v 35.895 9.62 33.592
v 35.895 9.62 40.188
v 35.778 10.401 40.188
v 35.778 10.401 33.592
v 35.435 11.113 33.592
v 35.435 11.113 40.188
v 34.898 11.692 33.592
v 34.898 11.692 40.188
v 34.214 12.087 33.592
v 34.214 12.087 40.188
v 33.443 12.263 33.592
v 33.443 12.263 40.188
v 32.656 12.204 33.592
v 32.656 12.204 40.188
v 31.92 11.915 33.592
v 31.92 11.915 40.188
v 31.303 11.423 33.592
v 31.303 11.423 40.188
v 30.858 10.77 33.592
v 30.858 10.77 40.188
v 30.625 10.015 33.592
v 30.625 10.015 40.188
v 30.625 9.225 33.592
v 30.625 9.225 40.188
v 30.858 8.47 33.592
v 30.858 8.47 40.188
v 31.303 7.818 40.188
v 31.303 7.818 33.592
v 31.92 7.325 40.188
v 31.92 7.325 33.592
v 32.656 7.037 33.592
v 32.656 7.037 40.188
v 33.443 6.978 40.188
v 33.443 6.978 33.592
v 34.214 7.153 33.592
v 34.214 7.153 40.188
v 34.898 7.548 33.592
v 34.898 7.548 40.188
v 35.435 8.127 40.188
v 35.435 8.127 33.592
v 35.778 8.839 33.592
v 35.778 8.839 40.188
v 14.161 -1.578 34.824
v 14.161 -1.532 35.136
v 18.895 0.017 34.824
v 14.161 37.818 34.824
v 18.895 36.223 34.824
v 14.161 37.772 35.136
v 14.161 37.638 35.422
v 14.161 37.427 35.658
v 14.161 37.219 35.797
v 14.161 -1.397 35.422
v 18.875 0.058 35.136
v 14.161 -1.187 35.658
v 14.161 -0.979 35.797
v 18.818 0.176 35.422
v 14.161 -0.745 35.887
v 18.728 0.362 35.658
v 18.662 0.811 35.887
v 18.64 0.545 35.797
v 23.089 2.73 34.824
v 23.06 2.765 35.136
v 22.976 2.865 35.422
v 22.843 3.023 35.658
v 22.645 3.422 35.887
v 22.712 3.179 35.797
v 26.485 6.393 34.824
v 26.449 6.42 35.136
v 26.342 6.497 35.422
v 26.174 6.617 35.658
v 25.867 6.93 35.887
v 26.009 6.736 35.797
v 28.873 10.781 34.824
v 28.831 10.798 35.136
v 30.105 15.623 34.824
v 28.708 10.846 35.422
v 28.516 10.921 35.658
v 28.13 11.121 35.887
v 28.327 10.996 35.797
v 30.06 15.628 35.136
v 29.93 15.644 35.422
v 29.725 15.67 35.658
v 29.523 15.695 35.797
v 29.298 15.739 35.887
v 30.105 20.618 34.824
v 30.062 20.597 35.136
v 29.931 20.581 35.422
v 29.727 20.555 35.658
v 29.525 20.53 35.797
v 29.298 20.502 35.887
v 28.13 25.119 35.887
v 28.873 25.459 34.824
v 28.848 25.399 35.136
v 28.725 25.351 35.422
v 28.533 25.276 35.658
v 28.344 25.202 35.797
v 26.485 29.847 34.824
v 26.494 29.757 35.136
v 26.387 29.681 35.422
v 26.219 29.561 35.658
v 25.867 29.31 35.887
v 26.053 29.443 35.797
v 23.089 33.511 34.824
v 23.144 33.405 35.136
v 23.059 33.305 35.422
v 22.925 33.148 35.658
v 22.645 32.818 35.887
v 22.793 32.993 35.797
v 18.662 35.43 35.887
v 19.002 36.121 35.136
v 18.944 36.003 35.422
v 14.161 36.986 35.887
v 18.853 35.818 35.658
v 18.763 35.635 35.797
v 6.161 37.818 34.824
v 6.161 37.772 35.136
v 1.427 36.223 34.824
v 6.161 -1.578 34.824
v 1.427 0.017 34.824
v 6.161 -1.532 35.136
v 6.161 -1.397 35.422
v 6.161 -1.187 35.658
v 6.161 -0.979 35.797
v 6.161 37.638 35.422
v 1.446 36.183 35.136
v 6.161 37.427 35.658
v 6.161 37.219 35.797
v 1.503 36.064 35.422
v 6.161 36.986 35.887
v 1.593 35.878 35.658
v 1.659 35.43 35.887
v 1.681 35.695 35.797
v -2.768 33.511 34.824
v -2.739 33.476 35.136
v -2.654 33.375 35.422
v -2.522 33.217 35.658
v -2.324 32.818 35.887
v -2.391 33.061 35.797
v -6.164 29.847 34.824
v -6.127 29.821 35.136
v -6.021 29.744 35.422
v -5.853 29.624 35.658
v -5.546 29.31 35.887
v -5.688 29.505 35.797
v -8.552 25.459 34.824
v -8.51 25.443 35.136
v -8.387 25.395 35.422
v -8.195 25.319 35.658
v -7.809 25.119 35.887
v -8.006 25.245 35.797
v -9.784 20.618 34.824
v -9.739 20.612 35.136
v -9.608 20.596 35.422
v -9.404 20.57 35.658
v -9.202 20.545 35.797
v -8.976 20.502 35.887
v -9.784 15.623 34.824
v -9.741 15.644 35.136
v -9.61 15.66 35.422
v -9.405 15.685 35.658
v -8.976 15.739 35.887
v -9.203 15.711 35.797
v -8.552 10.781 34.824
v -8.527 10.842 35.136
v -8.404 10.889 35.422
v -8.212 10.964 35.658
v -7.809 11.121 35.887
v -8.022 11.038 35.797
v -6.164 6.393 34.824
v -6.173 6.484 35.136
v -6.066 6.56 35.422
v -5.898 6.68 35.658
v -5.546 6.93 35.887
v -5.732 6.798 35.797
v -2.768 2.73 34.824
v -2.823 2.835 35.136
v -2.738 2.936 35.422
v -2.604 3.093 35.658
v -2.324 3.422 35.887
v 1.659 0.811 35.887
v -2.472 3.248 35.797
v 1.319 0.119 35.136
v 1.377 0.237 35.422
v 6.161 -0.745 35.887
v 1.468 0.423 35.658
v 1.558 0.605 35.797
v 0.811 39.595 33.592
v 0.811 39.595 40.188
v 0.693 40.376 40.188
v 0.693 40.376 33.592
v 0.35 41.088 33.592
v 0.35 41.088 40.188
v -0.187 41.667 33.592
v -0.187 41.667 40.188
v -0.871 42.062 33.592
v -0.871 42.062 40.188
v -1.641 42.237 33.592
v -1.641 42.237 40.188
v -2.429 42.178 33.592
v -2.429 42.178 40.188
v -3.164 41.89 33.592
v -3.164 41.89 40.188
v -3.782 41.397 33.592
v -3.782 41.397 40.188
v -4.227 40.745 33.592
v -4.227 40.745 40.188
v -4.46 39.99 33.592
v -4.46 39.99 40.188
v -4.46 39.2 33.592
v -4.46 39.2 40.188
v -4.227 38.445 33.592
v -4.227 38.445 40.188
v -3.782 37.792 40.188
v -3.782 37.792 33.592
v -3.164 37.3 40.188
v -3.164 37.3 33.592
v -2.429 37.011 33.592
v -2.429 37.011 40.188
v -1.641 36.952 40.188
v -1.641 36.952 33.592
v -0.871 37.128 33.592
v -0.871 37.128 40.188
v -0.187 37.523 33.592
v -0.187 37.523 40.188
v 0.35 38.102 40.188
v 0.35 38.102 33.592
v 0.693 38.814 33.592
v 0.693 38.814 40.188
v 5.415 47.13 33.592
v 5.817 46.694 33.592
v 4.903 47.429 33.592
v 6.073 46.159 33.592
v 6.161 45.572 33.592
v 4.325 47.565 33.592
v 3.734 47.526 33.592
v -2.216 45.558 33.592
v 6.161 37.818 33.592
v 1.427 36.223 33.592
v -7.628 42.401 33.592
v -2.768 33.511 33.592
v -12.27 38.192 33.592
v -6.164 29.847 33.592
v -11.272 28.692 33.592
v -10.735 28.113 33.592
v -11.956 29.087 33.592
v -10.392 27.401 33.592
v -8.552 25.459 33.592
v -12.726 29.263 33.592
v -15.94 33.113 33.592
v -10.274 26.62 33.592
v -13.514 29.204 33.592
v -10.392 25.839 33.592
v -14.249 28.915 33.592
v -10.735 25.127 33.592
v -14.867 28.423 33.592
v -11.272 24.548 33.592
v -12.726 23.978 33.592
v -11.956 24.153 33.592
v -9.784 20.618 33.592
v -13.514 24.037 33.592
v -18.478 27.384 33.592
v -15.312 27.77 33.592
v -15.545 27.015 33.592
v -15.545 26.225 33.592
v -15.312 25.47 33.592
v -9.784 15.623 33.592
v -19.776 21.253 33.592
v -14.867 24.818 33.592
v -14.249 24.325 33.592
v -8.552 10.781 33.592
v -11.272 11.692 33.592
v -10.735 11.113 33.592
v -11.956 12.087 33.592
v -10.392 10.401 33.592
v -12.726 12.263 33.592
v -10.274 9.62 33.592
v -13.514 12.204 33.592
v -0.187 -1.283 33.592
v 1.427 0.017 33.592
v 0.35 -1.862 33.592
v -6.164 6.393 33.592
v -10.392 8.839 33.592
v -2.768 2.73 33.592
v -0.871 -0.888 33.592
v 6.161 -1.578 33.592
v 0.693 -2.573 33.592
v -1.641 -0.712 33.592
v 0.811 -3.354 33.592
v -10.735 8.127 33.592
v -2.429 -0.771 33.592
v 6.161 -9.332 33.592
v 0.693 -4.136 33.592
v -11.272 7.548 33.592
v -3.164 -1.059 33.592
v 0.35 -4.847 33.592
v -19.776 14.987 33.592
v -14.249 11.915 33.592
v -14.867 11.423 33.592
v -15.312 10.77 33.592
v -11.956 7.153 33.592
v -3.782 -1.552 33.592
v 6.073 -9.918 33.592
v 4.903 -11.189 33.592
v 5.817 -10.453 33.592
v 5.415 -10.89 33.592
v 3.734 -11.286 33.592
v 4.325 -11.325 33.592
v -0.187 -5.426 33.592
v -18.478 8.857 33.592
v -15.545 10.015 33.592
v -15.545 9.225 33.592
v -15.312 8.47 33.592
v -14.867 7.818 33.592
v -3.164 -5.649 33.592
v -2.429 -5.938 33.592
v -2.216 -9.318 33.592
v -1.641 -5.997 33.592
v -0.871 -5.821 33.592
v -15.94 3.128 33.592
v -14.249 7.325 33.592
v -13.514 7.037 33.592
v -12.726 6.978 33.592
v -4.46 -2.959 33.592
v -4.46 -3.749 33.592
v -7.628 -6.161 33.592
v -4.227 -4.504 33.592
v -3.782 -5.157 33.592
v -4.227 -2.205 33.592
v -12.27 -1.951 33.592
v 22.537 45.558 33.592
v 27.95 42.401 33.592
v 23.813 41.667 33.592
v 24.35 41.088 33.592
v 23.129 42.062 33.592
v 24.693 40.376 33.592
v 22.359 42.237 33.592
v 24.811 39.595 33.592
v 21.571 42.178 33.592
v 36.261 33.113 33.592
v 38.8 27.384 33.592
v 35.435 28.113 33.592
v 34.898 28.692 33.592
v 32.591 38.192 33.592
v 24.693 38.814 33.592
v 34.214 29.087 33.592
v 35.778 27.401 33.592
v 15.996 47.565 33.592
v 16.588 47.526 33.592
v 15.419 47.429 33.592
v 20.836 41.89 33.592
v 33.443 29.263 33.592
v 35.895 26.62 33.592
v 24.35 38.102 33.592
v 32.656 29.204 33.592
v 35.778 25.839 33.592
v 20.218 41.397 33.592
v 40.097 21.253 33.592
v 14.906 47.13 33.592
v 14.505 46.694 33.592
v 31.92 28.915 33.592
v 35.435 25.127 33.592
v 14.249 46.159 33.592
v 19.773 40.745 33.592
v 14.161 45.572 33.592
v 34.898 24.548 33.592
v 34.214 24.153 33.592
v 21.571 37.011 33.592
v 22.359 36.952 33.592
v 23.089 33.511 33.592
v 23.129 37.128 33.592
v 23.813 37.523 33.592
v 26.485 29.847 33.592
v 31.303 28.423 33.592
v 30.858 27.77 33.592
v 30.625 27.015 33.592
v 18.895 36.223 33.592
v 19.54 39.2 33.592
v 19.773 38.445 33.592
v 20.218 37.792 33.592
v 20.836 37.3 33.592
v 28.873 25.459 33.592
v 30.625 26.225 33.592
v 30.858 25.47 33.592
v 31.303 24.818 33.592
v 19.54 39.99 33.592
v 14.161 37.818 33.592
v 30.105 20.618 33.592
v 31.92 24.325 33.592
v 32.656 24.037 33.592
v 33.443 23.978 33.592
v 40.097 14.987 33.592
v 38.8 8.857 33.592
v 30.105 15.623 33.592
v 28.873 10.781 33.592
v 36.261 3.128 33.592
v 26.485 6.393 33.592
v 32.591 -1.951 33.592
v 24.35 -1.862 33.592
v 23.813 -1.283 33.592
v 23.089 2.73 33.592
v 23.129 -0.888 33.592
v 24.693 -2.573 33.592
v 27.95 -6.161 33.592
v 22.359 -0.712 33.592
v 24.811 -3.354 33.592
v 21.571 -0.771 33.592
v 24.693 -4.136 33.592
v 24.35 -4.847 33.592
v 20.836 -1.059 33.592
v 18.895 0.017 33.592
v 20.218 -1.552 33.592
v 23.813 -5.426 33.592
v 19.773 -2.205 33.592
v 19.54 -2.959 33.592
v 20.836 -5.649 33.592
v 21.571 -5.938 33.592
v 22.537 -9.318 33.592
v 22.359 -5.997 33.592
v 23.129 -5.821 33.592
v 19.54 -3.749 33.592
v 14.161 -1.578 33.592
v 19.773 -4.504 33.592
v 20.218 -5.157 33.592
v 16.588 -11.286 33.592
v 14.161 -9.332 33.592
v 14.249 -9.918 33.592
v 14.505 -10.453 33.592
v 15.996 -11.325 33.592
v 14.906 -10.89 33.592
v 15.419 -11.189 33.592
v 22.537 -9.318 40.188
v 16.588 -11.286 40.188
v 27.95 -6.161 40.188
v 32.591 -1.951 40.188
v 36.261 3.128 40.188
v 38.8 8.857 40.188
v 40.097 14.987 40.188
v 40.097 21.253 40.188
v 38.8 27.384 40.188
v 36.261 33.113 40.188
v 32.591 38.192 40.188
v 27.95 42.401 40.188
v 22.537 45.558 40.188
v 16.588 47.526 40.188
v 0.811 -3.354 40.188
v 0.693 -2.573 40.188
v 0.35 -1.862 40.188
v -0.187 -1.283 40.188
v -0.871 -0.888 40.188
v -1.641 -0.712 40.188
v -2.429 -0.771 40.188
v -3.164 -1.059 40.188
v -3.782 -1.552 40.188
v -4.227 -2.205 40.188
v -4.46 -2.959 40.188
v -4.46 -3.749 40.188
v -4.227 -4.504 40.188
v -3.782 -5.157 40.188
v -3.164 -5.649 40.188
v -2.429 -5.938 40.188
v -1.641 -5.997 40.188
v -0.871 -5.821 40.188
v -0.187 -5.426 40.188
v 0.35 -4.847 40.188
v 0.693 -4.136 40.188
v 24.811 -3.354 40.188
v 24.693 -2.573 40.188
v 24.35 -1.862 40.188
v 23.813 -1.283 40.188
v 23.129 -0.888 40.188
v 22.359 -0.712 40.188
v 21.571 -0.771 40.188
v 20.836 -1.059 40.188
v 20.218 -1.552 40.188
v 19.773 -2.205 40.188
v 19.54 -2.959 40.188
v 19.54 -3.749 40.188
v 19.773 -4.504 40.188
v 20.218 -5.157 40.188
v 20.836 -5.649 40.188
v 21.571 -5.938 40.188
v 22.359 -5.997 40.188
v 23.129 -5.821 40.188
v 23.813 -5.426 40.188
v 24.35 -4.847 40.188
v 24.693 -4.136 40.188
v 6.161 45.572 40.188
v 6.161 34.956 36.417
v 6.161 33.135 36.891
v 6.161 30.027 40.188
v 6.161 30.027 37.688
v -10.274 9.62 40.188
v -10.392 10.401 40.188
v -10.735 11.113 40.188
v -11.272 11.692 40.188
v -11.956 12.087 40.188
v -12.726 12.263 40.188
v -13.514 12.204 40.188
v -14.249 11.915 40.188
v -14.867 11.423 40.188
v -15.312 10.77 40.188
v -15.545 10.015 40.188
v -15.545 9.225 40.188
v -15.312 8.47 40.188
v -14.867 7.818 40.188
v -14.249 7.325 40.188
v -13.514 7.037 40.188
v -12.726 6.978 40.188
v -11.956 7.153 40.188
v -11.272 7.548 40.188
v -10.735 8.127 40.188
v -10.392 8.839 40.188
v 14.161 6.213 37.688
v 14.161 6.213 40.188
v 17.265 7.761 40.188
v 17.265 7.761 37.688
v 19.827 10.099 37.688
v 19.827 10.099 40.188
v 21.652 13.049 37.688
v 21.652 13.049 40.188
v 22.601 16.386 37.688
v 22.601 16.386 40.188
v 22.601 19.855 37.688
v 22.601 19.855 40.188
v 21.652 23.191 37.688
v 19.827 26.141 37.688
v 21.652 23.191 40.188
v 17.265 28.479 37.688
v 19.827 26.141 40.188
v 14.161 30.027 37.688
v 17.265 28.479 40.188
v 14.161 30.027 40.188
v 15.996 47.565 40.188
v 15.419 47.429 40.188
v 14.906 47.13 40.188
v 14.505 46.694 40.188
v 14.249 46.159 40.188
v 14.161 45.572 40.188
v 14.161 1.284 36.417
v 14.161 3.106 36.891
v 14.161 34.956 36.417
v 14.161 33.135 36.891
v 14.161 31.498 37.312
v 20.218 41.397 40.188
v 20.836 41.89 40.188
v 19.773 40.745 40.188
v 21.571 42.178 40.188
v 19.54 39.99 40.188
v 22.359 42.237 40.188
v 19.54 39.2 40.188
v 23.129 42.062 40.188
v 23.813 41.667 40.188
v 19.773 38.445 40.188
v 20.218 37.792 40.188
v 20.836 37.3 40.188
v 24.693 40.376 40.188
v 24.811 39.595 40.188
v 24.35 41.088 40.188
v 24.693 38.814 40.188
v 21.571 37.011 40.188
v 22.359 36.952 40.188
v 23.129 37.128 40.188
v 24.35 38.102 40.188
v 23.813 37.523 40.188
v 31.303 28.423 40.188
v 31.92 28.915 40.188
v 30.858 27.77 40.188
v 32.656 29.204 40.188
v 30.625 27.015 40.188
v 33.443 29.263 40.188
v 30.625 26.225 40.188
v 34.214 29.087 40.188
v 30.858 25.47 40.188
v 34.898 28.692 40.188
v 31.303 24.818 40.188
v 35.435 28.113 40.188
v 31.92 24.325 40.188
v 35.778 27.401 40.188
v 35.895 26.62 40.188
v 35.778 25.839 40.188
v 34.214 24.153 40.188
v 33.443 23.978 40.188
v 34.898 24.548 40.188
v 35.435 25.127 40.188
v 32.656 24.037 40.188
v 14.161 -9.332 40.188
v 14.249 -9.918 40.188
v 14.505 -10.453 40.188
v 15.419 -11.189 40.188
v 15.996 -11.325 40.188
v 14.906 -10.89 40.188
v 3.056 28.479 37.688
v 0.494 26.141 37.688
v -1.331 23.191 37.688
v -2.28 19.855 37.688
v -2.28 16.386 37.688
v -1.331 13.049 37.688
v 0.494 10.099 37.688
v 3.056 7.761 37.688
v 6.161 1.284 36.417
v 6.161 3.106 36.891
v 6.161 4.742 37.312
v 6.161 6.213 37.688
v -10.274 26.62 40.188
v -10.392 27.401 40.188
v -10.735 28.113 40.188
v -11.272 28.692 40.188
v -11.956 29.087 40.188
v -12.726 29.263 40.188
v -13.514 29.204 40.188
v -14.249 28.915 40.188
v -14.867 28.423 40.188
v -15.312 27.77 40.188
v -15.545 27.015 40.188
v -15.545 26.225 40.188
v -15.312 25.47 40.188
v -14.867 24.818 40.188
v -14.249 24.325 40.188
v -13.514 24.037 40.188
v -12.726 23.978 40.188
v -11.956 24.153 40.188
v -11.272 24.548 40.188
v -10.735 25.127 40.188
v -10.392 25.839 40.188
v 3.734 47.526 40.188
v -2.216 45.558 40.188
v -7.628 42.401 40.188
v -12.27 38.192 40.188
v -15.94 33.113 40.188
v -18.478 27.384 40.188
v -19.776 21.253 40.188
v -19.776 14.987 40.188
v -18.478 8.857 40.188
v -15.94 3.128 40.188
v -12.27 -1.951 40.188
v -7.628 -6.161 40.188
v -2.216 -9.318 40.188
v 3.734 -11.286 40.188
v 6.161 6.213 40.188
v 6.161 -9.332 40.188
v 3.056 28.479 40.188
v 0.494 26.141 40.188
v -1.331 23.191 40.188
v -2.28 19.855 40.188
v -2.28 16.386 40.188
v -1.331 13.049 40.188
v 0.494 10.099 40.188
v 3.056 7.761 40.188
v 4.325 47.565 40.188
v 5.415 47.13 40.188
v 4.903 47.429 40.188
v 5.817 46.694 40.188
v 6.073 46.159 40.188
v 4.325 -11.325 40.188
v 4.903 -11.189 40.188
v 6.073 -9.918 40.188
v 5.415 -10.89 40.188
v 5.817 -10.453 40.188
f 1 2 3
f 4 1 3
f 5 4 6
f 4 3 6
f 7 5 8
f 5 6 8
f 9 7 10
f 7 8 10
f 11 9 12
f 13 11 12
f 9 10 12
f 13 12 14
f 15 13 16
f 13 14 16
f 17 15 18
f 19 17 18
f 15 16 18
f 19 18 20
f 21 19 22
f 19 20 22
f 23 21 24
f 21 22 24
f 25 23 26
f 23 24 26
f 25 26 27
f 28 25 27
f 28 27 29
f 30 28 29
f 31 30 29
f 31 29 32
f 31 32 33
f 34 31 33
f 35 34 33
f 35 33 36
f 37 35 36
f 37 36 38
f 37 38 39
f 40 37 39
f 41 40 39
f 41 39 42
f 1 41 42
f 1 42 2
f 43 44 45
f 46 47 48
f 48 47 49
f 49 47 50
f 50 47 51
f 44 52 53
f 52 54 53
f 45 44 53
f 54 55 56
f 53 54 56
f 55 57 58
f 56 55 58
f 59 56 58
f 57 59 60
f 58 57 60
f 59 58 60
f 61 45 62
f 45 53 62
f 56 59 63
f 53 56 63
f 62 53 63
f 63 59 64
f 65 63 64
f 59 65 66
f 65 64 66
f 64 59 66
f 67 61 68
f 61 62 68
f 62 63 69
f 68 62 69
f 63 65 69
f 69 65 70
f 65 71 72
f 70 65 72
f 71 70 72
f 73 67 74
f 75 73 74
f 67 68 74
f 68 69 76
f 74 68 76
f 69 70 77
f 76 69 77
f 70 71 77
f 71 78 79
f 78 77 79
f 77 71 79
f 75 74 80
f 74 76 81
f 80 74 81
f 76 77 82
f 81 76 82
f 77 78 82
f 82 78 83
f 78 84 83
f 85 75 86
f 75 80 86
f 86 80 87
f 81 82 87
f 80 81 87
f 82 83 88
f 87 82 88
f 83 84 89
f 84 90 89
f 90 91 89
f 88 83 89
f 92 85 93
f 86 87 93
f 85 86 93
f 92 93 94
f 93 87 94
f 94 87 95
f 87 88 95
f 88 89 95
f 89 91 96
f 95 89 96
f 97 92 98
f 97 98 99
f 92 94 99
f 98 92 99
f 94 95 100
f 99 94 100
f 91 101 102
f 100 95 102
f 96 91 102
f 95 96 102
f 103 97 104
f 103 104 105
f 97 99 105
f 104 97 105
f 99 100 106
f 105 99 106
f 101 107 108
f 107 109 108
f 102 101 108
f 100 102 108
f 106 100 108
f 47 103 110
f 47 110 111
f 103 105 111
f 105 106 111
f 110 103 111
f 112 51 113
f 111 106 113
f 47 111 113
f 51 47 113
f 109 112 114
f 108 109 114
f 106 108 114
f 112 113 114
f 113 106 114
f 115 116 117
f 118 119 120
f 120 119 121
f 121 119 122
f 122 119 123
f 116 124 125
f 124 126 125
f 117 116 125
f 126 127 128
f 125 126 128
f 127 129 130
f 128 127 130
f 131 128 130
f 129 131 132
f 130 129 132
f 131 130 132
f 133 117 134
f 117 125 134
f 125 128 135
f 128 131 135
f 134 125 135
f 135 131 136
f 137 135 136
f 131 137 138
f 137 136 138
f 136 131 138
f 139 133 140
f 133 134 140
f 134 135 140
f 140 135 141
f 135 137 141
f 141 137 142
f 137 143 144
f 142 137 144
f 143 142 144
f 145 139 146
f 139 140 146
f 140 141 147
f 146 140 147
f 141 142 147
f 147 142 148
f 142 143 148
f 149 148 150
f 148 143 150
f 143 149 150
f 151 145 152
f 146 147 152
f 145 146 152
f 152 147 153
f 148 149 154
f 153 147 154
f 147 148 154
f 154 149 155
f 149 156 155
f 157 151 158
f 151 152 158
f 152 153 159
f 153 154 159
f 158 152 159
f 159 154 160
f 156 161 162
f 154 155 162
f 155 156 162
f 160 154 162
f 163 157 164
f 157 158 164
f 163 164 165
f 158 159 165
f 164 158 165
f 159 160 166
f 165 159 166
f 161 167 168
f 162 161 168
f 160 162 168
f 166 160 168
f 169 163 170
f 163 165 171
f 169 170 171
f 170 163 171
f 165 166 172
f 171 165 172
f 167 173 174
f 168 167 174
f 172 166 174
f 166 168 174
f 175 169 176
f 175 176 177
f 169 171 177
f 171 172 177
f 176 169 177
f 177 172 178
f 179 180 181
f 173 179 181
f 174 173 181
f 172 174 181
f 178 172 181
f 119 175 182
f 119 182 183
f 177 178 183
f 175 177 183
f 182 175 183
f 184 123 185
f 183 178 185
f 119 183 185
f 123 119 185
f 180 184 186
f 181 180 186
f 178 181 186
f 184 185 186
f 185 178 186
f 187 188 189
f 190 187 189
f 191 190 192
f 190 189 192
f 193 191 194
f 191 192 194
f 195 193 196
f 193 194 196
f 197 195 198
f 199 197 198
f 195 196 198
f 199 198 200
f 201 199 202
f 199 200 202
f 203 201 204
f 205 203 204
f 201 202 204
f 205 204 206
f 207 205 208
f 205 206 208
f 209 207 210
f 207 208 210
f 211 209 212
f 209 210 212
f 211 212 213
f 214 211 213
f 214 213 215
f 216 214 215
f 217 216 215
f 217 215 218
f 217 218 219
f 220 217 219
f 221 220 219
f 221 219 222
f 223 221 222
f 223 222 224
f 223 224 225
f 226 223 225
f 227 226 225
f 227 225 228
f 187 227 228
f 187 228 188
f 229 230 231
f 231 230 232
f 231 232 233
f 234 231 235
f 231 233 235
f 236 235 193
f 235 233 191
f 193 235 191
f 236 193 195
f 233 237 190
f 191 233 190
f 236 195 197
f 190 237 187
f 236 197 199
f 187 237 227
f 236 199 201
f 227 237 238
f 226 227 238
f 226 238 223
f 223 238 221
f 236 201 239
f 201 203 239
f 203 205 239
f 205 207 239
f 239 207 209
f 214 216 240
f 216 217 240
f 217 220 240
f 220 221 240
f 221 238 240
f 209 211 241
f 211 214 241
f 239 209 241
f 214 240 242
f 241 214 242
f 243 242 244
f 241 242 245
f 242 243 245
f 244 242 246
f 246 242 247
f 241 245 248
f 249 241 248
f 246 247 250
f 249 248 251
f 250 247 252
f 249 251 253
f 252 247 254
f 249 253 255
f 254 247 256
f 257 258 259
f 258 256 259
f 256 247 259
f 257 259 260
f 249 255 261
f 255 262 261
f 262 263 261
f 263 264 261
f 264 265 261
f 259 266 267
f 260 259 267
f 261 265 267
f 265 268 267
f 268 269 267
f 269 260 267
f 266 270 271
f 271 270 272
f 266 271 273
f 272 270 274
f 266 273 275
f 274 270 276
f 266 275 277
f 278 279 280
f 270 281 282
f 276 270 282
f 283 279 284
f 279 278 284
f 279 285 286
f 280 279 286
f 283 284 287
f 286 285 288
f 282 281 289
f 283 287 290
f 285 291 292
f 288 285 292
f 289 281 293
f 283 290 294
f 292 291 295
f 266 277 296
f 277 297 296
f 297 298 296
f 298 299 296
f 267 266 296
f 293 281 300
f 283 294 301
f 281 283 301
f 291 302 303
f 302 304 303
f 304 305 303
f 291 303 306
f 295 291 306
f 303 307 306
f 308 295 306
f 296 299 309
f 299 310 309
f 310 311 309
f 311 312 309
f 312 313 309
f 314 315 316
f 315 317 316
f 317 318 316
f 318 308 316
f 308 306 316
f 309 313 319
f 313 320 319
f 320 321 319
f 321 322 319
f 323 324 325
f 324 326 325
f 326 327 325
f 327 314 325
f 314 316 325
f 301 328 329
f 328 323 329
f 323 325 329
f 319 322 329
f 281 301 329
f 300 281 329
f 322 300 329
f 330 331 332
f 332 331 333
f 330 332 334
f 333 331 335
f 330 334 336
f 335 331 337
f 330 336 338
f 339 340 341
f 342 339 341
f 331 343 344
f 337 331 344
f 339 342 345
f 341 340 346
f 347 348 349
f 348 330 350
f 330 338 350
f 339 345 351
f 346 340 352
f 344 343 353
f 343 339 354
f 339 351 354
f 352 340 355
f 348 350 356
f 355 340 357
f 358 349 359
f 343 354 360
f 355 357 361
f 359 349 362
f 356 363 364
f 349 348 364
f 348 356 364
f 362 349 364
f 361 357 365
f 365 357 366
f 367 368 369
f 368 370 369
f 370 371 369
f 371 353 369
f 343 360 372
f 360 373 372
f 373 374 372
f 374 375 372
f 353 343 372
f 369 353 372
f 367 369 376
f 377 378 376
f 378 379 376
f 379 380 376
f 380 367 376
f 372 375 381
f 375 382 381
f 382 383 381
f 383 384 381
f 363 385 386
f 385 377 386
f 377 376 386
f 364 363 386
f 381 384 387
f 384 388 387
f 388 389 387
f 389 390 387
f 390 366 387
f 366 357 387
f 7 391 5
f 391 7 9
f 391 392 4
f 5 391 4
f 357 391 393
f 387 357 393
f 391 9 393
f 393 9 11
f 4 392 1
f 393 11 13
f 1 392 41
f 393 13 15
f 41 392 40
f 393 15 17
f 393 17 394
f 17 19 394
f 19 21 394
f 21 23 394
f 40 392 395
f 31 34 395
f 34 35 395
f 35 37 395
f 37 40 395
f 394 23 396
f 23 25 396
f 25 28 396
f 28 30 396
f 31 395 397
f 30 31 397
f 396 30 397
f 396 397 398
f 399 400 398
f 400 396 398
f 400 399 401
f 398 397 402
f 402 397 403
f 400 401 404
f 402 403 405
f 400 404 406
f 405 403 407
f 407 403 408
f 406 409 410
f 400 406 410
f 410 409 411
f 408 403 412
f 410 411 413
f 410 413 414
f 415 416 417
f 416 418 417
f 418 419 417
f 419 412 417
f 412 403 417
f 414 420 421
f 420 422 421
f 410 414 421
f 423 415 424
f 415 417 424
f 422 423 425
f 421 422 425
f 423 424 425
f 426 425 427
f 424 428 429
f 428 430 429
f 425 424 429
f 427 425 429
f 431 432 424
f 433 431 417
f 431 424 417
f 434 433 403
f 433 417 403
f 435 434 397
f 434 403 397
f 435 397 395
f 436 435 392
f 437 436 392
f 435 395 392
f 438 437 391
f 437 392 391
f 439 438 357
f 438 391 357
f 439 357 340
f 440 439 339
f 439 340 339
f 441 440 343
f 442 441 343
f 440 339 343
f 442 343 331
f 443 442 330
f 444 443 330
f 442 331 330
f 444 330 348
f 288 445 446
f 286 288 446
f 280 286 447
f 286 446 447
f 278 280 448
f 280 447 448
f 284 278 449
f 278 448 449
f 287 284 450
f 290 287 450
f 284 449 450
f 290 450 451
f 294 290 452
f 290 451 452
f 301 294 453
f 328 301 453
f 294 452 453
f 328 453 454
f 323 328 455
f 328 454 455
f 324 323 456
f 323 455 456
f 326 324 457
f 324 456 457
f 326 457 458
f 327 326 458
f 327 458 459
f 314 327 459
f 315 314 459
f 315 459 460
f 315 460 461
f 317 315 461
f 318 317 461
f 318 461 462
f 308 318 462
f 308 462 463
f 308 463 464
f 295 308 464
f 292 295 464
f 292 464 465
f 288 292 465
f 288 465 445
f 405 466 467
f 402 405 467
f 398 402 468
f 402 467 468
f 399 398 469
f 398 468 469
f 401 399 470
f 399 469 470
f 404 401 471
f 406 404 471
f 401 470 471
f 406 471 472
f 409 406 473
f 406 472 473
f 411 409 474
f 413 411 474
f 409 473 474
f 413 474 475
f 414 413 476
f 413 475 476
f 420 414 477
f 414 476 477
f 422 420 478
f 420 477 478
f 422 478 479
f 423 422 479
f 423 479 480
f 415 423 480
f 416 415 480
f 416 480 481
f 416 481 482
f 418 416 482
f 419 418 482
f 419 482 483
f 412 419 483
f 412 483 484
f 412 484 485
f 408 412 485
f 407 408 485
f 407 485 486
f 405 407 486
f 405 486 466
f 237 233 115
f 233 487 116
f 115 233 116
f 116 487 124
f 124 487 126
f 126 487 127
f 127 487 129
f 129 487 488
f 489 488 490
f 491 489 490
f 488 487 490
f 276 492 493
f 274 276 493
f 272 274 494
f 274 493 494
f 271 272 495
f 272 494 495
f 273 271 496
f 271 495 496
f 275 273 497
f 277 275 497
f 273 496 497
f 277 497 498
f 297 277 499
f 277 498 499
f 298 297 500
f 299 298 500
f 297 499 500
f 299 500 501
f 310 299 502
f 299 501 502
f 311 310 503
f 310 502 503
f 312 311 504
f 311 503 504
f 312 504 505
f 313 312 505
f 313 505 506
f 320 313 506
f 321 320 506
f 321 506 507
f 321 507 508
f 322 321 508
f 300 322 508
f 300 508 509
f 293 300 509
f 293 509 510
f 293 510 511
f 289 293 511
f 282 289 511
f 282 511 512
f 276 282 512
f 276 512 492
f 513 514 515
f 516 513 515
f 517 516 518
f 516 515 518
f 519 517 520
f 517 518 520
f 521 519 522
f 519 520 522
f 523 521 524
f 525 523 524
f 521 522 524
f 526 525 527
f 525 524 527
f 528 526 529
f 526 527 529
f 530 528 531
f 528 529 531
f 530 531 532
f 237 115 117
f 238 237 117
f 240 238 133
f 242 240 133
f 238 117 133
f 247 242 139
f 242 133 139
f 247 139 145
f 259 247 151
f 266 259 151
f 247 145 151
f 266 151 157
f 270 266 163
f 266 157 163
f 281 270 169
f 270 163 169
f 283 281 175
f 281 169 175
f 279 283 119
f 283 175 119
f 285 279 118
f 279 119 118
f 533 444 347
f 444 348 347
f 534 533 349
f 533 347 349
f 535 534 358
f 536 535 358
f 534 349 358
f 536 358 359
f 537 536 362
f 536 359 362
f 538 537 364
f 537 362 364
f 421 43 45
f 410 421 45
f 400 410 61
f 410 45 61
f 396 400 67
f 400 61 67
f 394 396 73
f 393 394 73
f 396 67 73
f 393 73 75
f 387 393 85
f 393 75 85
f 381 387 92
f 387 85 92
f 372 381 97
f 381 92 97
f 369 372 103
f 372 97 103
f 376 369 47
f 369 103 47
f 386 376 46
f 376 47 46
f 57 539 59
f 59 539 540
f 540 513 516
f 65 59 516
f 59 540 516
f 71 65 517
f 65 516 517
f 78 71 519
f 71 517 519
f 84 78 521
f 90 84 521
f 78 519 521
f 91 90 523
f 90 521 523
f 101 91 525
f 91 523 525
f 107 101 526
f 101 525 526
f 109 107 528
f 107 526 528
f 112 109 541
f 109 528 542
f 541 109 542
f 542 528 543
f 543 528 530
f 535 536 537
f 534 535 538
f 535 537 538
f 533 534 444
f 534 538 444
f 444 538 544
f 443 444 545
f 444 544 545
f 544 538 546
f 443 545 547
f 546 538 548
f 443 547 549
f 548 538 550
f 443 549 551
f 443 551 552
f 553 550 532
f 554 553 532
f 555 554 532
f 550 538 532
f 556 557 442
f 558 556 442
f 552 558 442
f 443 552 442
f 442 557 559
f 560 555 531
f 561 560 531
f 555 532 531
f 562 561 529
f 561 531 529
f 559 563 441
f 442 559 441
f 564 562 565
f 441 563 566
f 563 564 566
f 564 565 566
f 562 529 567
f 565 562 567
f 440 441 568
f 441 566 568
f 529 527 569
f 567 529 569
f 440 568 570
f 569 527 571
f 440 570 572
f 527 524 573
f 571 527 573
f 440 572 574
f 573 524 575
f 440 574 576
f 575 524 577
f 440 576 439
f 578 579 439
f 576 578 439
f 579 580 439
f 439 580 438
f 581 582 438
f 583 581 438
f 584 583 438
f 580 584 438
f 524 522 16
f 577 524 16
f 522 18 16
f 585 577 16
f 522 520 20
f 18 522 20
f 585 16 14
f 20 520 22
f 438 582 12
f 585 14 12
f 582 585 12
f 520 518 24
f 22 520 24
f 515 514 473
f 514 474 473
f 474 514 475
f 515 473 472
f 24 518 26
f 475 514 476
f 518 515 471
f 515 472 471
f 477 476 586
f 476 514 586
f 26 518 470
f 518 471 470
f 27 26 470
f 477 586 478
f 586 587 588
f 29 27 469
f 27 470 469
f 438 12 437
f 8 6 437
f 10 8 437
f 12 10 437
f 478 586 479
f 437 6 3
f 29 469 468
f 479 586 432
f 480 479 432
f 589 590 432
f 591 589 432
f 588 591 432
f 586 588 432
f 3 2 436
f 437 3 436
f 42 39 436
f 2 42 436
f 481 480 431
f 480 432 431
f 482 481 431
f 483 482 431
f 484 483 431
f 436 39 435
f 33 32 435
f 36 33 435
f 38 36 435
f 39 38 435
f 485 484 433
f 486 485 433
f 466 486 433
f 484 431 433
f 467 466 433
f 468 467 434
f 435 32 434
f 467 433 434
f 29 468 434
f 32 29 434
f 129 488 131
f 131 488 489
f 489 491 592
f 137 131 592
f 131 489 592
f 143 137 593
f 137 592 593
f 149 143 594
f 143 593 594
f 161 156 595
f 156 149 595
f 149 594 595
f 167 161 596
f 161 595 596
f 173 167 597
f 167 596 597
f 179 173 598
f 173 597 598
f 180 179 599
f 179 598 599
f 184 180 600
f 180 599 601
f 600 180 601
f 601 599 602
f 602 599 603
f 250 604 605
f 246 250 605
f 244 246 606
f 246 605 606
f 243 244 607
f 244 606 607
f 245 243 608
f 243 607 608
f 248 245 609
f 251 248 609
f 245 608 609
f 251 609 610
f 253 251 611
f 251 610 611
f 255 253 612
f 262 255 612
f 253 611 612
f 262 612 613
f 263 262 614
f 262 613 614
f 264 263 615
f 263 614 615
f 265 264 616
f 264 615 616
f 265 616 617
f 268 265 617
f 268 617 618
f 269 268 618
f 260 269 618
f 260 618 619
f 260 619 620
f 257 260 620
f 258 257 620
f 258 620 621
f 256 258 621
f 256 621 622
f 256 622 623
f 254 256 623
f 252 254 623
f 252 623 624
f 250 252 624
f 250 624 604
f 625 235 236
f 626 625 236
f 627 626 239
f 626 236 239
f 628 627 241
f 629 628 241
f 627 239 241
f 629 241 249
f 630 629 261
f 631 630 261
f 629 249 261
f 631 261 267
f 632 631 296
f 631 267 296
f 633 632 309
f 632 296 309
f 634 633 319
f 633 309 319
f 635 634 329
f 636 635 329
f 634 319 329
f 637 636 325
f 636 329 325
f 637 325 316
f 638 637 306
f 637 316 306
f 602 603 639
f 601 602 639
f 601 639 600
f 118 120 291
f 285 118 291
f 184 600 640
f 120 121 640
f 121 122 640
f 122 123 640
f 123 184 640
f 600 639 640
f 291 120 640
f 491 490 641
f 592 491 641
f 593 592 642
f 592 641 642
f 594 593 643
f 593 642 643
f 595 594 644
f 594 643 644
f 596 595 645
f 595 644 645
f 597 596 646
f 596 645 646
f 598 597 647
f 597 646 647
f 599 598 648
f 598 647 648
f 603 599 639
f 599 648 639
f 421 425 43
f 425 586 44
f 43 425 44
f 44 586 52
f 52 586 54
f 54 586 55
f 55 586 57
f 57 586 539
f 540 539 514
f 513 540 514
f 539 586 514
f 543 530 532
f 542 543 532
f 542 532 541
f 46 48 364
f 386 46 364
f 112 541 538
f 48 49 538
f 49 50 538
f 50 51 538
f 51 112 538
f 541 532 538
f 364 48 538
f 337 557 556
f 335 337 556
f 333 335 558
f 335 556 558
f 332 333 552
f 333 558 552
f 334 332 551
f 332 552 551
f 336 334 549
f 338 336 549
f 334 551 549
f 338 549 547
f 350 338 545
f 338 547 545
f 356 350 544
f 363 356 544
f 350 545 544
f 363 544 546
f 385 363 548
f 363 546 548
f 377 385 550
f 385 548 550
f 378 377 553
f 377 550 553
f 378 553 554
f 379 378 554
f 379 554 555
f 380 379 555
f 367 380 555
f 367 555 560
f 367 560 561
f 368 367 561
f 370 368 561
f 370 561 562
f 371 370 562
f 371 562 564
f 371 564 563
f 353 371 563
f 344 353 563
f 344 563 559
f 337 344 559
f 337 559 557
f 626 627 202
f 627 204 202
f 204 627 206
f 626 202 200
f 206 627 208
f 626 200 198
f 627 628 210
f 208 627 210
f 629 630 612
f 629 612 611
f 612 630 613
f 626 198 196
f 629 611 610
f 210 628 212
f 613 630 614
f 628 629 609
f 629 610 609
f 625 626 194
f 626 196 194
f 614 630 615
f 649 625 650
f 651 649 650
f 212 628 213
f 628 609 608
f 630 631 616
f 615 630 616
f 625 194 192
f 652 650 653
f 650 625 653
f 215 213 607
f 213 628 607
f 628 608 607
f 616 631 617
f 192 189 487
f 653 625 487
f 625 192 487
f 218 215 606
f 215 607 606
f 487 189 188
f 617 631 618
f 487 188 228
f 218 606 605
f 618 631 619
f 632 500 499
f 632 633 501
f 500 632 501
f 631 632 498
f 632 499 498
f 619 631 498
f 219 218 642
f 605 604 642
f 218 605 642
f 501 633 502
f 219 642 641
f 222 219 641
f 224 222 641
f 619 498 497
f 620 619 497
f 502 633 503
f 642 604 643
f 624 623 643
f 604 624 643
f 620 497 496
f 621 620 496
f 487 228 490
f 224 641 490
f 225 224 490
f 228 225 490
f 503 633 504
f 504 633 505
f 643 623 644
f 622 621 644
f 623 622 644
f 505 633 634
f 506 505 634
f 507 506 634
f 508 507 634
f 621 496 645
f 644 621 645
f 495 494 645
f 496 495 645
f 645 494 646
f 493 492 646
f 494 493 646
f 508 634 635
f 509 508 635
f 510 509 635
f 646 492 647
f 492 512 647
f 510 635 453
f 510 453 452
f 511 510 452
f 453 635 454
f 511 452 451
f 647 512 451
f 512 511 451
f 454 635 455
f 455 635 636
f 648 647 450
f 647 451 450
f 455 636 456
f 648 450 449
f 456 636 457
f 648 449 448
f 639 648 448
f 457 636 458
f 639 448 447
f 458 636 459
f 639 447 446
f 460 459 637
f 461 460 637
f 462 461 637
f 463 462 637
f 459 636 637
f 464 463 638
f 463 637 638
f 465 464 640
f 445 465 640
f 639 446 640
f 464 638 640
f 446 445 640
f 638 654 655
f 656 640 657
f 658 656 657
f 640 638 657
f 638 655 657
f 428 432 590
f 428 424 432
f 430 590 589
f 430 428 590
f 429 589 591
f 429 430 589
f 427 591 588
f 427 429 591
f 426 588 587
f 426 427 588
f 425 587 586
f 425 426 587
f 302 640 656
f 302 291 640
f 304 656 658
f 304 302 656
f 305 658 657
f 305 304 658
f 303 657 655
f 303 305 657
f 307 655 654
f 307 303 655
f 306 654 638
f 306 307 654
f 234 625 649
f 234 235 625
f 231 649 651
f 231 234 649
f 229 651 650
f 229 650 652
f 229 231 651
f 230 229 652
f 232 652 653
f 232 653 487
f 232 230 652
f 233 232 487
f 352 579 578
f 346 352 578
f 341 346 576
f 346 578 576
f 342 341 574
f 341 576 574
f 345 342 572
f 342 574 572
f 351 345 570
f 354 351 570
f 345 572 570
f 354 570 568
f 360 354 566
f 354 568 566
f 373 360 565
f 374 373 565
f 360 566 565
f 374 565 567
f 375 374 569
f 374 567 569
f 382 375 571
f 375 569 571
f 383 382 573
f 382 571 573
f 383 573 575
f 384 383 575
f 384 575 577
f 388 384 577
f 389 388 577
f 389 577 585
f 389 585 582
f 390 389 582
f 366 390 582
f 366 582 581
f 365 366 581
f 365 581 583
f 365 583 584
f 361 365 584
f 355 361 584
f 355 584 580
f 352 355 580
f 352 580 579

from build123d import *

# Parameters (mm, degrees)
SKETCH3_R          = 2.65
CUT_EXTRUDE1_DEPTH = 10
FILLET1_R          = 2
FILLET2_R          = 2


with BuildPart() as part:
    # Sketch2 → Revolve2 (revolve)
    with BuildSketch(Plane(origin=(0, 18.12022925, 0), x_dir=(1, 0, 0), z_dir=(0, 1, 0)), mode=Mode.PRIVATE) as revolve2_sk:
        with BuildLine():
            Line((29.445318103, -35.886599973), (22.721499058, -37.688241856))
            Line((22.721499058, -37.688241856), (22.721499058, -40.188241856))
            Line((22.721499058, -40.188241856), (40.260617153, -40.188241856))
            Line((40.260617153, -40.188241856), (40.260617153, -33.591649273))
            Line((40.260617153, -33.591649273), (30.260617153, -33.591649273))
            Line((30.260617153, -33.591649273), (30.260617153, -34.824081564))
            ThreePointArc((30.260617153, -34.824081564), (30.033305828, -35.493719136), (29.445318103, -35.886599973))
        make_face()
    revolve(revolve2_sk.sketch.rotate(Axis((10.160617153, 18.12022925, 37.591649273), (0, 0, 1)), 180), axis=Axis((10.160617153, 18.12022925, 37.591649273), (0, 0, 1)))

    # Sketch3 → Cut-Extrude1 (cut)
    with BuildSketch(Plane.XY.offset(40.188241856)):
        with BuildLine():
            ThreePointArc((6.160617153, -11.71280613), (10.160617153, -11.97977075), (14.160617153, -11.71280613))
            Line((14.160617153, -11.71280613), (14.160617153, 6.213266824))
            ThreePointArc((14.160617153, 6.213266824), (10.160617153, 5.559347346), (6.160617153, 6.213266824))
            Line((6.160617153, 6.213266824), (6.160617153, -11.71280613))
        make_face()
        with BuildLine():
            ThreePointArc((6.160617153, 30.027191676), (10.160617153, 30.681111155), (14.160617153, 30.027191676))
            Line((14.160617153, 30.027191676), (14.160617153, 47.95326463))
            ThreePointArc((14.160617153, 47.95326463), (10.160617153, 48.22022925), (6.160617153, 47.95326463))
            Line((6.160617153, 47.95326463), (6.160617153, 30.027191676))
        make_face()
        with Locations((-1.839382847, 39.594865452)):
            Circle(SKETCH3_R)
        with Locations((-12.924226359, 26.62022925)):
            Circle(SKETCH3_R)
        with Locations((-12.924226359, 9.62022925)):
            Circle(SKETCH3_R)
        with Locations((-1.839382847, -3.354406952)):
            Circle(SKETCH3_R)
        with Locations((22.160617153, -3.354406952)):
            Circle(SKETCH3_R)
        with Locations((33.245460666, 9.62022925)):
            Circle(SKETCH3_R)
        with Locations((33.245460666, 26.62022925)):
            Circle(SKETCH3_R)
        with Locations((22.160617153, 39.594865452)):
            Circle(SKETCH3_R)
    extrude(amount=-CUT_EXTRUDE1_DEPTH, mode=Mode.SUBTRACT)


with BuildPart() as cut_extrude1_piece_1:
    # of the separate pieces the step leaves, piece 1, a body of its own (cut_extrude1_pieces)
    add(part.part.solids().sort_by_distance((14.160617153, -1.577740188, 34.824081564))[0])

    # Fillet2
    fillet2_edges = [cut_extrude1_piece_1.edges().sort_by_distance(p)[0] for p in [
        (14.160617153, 47.95326463, 36.889945565),
        (14.160617153, -11.71280613, 36.889945565),
    ]]
    fillet(fillet2_edges, radius=FILLET2_R)


with BuildPart() as cut_extrude1_piece_2:
    # of the separate pieces the step leaves, piece 2, a body of its own (cut_extrude1_pieces)
    add(part.part.solids().sort_by_distance((6.160617153, 36.985533136, 35.886599973))[0])

    # Fillet1
    fillet1_edges = [cut_extrude1_piece_2.edges().sort_by_distance(p)[0] for p in [
        (6.160617153, -11.71280613, 36.889945565),
        (6.160617153, 47.95326463, 36.889945565),
    ]]
    fillet(fillet1_edges, radius=FILLET1_R)


solid = Compound([cut_extrude1_piece_1.part, cut_extrude1_piece_2.part])
